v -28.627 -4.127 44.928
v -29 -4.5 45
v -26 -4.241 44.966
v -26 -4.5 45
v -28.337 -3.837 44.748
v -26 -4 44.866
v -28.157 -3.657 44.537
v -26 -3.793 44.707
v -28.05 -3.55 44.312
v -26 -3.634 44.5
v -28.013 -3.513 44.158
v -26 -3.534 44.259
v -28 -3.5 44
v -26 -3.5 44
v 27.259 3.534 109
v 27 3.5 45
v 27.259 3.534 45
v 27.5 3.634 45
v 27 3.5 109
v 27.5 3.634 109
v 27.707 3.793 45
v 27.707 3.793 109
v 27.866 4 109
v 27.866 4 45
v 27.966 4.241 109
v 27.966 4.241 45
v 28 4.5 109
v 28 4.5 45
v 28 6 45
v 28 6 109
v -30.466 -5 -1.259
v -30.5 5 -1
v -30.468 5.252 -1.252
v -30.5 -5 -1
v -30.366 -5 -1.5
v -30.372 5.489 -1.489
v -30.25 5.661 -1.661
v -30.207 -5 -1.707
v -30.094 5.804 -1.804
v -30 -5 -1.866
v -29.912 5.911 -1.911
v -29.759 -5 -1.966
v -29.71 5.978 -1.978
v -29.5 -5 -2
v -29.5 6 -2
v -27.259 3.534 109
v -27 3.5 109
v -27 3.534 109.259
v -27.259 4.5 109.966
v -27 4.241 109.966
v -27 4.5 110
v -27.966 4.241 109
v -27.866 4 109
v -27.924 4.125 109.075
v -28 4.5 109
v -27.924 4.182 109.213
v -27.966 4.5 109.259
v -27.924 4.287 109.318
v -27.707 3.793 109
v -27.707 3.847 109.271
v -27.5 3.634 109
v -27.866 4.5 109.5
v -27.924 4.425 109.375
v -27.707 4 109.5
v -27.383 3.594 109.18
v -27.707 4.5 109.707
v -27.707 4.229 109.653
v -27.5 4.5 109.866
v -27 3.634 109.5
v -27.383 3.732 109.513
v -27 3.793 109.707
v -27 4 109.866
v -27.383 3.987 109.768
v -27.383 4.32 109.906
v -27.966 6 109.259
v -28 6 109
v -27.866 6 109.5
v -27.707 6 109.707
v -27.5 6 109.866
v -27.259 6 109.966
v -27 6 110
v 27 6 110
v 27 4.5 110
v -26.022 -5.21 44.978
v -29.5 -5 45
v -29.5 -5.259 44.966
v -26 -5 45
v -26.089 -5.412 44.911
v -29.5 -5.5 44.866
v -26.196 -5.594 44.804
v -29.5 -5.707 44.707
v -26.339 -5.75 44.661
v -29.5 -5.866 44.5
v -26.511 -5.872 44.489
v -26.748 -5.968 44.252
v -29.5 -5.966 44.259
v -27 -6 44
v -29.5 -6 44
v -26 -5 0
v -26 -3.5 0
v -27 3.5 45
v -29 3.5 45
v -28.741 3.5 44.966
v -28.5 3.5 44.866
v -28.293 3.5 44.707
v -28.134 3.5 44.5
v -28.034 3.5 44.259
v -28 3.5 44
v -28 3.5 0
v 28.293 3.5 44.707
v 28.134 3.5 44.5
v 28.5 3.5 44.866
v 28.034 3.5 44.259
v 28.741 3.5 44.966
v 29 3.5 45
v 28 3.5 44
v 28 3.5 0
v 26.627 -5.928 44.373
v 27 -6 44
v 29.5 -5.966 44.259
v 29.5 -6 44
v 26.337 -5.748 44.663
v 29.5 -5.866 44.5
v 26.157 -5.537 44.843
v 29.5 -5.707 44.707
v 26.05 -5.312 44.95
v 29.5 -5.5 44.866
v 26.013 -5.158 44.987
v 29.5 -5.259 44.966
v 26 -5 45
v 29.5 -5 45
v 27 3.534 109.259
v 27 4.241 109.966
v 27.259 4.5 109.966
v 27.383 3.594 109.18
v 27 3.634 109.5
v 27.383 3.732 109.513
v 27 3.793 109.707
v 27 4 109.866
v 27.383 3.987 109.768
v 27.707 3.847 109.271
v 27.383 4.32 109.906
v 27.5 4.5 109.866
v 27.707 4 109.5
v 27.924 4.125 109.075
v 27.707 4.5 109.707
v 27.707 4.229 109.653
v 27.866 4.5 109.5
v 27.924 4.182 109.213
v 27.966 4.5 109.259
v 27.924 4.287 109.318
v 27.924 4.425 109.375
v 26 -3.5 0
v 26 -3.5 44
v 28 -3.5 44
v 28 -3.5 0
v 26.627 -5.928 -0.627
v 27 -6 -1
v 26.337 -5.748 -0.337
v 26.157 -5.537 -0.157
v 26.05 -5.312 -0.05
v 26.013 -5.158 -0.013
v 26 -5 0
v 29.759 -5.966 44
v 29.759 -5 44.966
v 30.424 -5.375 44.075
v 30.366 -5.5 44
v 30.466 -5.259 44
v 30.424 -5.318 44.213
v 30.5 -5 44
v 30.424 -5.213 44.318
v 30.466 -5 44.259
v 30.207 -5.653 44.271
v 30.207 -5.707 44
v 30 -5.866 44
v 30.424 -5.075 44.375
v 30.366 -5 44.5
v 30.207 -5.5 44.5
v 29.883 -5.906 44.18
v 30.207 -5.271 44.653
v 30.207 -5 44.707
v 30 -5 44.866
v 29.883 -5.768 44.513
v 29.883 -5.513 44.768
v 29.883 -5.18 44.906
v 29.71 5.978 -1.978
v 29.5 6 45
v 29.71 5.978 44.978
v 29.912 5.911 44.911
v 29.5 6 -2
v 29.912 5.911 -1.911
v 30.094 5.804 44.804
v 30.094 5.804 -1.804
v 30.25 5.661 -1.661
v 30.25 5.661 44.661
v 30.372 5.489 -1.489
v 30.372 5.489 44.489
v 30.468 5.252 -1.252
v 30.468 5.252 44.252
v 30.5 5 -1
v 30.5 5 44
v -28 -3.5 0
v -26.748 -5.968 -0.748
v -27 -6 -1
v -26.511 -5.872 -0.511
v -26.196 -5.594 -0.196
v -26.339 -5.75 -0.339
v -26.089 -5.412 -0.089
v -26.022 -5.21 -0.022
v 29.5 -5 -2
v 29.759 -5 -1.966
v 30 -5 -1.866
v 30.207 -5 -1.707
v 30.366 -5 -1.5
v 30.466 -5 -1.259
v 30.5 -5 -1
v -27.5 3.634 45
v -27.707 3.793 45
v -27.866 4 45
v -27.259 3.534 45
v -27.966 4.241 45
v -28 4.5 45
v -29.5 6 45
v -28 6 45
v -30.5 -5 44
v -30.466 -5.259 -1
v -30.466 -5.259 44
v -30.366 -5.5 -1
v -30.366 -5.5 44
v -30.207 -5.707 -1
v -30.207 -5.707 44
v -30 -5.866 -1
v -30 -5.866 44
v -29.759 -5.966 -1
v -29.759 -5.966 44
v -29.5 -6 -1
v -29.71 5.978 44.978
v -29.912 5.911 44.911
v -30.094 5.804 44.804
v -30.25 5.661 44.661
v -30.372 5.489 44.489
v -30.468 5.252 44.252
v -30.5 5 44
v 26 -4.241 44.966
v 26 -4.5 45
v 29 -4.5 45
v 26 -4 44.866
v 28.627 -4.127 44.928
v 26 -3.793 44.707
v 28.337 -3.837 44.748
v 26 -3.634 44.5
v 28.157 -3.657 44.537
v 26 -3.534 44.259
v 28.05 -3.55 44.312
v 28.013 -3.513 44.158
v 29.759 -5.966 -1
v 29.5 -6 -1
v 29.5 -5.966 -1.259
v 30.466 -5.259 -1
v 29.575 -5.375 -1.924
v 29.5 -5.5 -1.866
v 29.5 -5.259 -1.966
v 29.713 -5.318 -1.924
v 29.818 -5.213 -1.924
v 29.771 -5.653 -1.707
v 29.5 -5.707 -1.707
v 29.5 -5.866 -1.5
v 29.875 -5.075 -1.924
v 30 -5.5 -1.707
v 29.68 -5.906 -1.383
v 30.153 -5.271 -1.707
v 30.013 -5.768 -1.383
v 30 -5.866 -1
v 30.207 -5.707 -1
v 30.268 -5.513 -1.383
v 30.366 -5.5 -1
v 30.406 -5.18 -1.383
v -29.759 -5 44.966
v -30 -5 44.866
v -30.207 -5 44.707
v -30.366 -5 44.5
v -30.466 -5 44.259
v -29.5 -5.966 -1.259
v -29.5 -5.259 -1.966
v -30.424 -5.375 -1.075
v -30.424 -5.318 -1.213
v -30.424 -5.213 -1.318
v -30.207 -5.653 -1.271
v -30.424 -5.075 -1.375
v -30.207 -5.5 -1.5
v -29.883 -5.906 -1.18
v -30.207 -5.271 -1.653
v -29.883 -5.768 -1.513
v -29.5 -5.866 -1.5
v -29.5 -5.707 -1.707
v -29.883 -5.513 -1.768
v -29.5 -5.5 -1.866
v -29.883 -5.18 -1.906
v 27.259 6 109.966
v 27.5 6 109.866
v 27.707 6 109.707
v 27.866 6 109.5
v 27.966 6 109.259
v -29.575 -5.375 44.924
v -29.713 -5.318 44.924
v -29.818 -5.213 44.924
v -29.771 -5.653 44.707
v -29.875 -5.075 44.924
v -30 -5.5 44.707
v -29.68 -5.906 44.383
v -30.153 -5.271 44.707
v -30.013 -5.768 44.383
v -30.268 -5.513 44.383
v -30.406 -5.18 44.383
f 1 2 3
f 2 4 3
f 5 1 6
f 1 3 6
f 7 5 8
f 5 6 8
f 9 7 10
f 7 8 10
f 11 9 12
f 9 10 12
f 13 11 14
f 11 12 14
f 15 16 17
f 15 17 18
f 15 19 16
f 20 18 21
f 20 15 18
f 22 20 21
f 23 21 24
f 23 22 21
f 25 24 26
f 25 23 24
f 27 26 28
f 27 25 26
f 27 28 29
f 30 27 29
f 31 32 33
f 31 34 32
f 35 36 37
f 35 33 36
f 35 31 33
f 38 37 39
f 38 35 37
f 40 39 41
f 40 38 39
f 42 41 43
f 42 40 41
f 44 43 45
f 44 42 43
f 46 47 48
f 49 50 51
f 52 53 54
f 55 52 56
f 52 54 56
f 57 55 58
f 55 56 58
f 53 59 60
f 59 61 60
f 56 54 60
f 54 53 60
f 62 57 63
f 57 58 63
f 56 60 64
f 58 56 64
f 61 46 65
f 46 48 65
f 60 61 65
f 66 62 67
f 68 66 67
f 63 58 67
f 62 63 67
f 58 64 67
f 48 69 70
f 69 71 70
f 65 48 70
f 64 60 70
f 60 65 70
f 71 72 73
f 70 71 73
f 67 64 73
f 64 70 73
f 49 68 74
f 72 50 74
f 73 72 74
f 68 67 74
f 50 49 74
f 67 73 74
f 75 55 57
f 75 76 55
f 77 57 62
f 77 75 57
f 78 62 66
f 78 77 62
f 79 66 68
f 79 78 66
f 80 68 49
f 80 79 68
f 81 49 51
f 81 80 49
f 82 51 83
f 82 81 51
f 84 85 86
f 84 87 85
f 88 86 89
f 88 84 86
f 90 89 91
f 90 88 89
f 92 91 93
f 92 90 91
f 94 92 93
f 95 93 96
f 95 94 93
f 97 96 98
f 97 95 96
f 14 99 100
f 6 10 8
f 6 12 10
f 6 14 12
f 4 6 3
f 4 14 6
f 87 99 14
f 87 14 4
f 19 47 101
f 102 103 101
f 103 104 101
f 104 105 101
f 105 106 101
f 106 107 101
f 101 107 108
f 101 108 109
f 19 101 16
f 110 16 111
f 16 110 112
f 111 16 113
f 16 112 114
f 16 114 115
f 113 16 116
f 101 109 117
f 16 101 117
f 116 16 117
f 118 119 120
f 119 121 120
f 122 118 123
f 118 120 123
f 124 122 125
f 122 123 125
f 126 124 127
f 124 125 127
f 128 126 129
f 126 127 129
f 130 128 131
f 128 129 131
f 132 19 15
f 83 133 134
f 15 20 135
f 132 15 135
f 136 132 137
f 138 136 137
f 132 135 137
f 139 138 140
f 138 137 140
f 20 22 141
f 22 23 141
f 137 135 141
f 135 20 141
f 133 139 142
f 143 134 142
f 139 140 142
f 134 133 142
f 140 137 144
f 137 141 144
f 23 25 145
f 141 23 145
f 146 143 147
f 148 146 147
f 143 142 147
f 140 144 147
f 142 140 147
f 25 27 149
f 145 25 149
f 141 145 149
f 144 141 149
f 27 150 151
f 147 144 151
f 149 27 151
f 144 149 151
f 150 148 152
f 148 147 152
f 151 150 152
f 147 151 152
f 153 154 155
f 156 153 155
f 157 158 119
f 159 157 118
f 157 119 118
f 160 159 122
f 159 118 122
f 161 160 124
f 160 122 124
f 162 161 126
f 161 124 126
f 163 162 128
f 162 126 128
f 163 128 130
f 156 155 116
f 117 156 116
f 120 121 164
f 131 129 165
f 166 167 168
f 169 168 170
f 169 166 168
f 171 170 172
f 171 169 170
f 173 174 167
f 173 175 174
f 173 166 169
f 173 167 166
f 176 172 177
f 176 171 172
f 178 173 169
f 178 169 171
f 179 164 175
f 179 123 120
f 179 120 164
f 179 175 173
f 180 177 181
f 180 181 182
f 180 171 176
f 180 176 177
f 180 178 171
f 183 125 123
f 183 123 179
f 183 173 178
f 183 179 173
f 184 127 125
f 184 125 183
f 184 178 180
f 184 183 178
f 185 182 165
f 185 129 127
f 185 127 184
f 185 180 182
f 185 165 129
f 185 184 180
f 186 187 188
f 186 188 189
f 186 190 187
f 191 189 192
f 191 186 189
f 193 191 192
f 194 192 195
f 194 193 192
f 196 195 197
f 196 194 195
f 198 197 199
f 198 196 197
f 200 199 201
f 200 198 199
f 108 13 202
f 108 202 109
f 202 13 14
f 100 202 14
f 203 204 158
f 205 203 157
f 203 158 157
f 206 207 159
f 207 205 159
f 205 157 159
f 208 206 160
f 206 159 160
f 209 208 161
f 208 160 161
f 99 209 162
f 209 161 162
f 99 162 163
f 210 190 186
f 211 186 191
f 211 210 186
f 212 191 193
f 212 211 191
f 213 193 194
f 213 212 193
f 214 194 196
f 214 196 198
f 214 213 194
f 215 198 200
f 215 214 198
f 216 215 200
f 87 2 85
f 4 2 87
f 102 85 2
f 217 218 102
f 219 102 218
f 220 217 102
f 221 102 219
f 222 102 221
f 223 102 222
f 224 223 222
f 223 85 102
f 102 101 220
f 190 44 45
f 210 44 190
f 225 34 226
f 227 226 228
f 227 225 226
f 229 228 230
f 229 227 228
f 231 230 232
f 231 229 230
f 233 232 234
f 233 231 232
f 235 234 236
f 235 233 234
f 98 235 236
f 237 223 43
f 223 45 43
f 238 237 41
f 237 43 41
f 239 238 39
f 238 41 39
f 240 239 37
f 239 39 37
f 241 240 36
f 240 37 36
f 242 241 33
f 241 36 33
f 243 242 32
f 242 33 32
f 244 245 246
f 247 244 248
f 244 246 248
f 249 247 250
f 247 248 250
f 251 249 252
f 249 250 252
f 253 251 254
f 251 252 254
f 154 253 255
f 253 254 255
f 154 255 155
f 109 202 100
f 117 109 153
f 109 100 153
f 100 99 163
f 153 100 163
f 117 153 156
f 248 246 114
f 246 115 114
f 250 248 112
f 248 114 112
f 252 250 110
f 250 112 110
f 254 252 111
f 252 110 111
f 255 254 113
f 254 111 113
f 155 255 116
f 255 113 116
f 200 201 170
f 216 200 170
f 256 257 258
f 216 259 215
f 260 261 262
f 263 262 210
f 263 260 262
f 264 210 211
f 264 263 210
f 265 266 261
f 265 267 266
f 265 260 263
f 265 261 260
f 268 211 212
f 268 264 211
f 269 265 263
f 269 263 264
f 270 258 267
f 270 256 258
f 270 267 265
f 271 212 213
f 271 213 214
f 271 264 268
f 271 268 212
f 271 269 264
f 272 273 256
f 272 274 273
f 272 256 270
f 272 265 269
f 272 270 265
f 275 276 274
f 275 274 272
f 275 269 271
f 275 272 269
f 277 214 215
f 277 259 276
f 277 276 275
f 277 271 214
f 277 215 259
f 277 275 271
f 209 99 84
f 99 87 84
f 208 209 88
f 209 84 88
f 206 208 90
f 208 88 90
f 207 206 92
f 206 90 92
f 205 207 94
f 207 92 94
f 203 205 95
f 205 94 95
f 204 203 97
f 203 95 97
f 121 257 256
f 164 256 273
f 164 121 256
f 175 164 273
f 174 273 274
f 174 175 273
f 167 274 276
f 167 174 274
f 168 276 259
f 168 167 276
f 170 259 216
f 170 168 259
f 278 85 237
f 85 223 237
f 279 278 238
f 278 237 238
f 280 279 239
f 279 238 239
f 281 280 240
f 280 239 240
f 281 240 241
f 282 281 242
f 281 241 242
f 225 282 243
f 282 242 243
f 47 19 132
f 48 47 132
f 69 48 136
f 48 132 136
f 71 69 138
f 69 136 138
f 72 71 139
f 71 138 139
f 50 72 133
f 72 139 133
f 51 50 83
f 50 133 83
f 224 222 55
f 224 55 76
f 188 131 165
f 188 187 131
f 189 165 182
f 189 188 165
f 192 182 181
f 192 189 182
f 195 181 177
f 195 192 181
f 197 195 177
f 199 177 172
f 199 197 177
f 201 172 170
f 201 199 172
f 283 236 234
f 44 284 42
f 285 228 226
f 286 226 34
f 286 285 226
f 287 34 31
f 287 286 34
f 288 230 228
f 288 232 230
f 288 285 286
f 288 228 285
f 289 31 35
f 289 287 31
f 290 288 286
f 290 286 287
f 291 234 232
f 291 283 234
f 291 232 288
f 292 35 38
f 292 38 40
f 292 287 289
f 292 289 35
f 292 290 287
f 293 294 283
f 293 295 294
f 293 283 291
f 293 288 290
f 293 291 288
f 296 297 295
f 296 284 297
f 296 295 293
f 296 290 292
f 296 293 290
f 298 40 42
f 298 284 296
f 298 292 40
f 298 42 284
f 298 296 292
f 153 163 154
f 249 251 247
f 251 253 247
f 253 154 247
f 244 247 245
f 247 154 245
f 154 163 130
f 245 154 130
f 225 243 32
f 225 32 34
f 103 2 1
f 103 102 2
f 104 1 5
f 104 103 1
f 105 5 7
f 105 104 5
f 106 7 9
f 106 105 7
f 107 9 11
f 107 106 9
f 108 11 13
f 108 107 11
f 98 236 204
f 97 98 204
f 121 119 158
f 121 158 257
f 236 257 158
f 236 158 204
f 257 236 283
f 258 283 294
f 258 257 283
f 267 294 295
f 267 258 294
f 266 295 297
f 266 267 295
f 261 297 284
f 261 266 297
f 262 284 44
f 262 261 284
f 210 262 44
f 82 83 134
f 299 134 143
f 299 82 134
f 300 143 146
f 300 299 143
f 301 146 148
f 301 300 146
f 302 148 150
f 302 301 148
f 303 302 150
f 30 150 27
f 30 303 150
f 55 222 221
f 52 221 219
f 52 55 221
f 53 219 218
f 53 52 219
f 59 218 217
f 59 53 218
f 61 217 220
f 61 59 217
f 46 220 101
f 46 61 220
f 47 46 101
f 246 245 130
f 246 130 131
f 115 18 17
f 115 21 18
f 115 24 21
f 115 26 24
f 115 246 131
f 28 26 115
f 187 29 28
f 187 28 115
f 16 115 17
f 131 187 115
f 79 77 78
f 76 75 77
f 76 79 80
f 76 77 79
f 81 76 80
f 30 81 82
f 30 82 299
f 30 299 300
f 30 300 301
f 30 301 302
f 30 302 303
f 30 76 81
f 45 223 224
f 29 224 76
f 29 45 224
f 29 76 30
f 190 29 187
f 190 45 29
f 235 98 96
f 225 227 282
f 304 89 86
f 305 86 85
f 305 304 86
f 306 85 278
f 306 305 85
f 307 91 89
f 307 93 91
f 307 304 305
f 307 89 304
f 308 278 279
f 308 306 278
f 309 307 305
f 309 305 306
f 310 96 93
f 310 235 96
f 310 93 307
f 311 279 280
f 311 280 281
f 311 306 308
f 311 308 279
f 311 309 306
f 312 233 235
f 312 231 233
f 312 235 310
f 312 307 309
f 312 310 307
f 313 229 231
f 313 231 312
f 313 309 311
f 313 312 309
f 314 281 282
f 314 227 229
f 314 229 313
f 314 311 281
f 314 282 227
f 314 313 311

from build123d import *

# Parameters (mm, degrees)
F0_W     = 61
F0_H     = 12
F0_W_2   = 56
F0_H_2   = 7
F1_DEPTH = 45
F2_W     = 52
F2_H     = 45
F3_DEPTH = 3
F4_W     = 61
F4_H     = 12
F5_DEPTH = 2
F6_W     = 56
F6_H     = 2.5
F7_DEPTH = 65
F8_R     = 0.99999
F9_R     = 0.99999


# Not quite as in the source:
# - a fillet or chamfer is up to 0.001 mm smaller than in the source, because OpenCascade refuses the exact size


with BuildPart() as f1:
    # F0 (on Top) → F1 (new body)
    with BuildSketch(Plane.XY):
        Rectangle(F0_W, F0_H)
        Rectangle(F0_W_2, F0_H_2, mode=Mode.SUBTRACT)
    extrude(amount=F1_DEPTH)

    # F2 (on face) → F3 (cut)
    with BuildSketch(Plane.XZ.offset(6)):
        with Locations((0, 22.5)):
            Rectangle(F2_W, F2_H)
    extrude(amount=-F3_DEPTH, mode=Mode.SUBTRACT)

    # F4 (on face) → F5 (join)
    with BuildSketch(Plane(origin=(0, 0, 0), x_dir=(1, 0, 0), z_dir=(0, 0, -1))):
        Rectangle(F4_W, F4_H)
    extrude(amount=F5_DEPTH)

    # F6 (on face) → F7 (join)
    with BuildSketch(Plane.XY.offset(45)):
        with Locations((0, 4.75)):
            Rectangle(F6_W, F6_H)
    extrude(amount=F7_DEPTH)

    # F8 (radius 1 in the source; OpenCascade refuses exactly that, so slightly less here)
    f8_edges = [f1.edges().sort_by_distance(p)[0] for p in [
        (-26, -6, 22.5),
        (0, -6, 0),
        (26, -6, 22.5),
        (28.25, -6, 45),
        (30.5, -6, 21.5),
        (0, -6, -2),
        (-30.5, -6, 21.5),
        (-28.25, -6, 45),
        (-28, 0, 45),
        (28, 0, 45),
        (27, -3.5, 45),
        (-27, -3.5, 45),
        (-30.5, 0, 45),
        (30.5, 0, 45),
        (30.5, 6, 21.5),
        (30.5, 0, -2),
        (-30.5, 6, 21.5),
        (-30.5, 0, -2),
        (0, 3.5, 110),
    ]]
    fillet(f8_edges, radius=F8_R)

    # F9 (radius 1 in the source; OpenCascade refuses exactly that, so slightly less here)
    f9_edges = [f1.edges().sort_by_distance(p)[0] for p in [
        (-28, 3.5, 77.000005),
        (28, 3.5, 77.000005),
    ]]
    fillet(f9_edges, radius=F9_R)


solid = f1.part
